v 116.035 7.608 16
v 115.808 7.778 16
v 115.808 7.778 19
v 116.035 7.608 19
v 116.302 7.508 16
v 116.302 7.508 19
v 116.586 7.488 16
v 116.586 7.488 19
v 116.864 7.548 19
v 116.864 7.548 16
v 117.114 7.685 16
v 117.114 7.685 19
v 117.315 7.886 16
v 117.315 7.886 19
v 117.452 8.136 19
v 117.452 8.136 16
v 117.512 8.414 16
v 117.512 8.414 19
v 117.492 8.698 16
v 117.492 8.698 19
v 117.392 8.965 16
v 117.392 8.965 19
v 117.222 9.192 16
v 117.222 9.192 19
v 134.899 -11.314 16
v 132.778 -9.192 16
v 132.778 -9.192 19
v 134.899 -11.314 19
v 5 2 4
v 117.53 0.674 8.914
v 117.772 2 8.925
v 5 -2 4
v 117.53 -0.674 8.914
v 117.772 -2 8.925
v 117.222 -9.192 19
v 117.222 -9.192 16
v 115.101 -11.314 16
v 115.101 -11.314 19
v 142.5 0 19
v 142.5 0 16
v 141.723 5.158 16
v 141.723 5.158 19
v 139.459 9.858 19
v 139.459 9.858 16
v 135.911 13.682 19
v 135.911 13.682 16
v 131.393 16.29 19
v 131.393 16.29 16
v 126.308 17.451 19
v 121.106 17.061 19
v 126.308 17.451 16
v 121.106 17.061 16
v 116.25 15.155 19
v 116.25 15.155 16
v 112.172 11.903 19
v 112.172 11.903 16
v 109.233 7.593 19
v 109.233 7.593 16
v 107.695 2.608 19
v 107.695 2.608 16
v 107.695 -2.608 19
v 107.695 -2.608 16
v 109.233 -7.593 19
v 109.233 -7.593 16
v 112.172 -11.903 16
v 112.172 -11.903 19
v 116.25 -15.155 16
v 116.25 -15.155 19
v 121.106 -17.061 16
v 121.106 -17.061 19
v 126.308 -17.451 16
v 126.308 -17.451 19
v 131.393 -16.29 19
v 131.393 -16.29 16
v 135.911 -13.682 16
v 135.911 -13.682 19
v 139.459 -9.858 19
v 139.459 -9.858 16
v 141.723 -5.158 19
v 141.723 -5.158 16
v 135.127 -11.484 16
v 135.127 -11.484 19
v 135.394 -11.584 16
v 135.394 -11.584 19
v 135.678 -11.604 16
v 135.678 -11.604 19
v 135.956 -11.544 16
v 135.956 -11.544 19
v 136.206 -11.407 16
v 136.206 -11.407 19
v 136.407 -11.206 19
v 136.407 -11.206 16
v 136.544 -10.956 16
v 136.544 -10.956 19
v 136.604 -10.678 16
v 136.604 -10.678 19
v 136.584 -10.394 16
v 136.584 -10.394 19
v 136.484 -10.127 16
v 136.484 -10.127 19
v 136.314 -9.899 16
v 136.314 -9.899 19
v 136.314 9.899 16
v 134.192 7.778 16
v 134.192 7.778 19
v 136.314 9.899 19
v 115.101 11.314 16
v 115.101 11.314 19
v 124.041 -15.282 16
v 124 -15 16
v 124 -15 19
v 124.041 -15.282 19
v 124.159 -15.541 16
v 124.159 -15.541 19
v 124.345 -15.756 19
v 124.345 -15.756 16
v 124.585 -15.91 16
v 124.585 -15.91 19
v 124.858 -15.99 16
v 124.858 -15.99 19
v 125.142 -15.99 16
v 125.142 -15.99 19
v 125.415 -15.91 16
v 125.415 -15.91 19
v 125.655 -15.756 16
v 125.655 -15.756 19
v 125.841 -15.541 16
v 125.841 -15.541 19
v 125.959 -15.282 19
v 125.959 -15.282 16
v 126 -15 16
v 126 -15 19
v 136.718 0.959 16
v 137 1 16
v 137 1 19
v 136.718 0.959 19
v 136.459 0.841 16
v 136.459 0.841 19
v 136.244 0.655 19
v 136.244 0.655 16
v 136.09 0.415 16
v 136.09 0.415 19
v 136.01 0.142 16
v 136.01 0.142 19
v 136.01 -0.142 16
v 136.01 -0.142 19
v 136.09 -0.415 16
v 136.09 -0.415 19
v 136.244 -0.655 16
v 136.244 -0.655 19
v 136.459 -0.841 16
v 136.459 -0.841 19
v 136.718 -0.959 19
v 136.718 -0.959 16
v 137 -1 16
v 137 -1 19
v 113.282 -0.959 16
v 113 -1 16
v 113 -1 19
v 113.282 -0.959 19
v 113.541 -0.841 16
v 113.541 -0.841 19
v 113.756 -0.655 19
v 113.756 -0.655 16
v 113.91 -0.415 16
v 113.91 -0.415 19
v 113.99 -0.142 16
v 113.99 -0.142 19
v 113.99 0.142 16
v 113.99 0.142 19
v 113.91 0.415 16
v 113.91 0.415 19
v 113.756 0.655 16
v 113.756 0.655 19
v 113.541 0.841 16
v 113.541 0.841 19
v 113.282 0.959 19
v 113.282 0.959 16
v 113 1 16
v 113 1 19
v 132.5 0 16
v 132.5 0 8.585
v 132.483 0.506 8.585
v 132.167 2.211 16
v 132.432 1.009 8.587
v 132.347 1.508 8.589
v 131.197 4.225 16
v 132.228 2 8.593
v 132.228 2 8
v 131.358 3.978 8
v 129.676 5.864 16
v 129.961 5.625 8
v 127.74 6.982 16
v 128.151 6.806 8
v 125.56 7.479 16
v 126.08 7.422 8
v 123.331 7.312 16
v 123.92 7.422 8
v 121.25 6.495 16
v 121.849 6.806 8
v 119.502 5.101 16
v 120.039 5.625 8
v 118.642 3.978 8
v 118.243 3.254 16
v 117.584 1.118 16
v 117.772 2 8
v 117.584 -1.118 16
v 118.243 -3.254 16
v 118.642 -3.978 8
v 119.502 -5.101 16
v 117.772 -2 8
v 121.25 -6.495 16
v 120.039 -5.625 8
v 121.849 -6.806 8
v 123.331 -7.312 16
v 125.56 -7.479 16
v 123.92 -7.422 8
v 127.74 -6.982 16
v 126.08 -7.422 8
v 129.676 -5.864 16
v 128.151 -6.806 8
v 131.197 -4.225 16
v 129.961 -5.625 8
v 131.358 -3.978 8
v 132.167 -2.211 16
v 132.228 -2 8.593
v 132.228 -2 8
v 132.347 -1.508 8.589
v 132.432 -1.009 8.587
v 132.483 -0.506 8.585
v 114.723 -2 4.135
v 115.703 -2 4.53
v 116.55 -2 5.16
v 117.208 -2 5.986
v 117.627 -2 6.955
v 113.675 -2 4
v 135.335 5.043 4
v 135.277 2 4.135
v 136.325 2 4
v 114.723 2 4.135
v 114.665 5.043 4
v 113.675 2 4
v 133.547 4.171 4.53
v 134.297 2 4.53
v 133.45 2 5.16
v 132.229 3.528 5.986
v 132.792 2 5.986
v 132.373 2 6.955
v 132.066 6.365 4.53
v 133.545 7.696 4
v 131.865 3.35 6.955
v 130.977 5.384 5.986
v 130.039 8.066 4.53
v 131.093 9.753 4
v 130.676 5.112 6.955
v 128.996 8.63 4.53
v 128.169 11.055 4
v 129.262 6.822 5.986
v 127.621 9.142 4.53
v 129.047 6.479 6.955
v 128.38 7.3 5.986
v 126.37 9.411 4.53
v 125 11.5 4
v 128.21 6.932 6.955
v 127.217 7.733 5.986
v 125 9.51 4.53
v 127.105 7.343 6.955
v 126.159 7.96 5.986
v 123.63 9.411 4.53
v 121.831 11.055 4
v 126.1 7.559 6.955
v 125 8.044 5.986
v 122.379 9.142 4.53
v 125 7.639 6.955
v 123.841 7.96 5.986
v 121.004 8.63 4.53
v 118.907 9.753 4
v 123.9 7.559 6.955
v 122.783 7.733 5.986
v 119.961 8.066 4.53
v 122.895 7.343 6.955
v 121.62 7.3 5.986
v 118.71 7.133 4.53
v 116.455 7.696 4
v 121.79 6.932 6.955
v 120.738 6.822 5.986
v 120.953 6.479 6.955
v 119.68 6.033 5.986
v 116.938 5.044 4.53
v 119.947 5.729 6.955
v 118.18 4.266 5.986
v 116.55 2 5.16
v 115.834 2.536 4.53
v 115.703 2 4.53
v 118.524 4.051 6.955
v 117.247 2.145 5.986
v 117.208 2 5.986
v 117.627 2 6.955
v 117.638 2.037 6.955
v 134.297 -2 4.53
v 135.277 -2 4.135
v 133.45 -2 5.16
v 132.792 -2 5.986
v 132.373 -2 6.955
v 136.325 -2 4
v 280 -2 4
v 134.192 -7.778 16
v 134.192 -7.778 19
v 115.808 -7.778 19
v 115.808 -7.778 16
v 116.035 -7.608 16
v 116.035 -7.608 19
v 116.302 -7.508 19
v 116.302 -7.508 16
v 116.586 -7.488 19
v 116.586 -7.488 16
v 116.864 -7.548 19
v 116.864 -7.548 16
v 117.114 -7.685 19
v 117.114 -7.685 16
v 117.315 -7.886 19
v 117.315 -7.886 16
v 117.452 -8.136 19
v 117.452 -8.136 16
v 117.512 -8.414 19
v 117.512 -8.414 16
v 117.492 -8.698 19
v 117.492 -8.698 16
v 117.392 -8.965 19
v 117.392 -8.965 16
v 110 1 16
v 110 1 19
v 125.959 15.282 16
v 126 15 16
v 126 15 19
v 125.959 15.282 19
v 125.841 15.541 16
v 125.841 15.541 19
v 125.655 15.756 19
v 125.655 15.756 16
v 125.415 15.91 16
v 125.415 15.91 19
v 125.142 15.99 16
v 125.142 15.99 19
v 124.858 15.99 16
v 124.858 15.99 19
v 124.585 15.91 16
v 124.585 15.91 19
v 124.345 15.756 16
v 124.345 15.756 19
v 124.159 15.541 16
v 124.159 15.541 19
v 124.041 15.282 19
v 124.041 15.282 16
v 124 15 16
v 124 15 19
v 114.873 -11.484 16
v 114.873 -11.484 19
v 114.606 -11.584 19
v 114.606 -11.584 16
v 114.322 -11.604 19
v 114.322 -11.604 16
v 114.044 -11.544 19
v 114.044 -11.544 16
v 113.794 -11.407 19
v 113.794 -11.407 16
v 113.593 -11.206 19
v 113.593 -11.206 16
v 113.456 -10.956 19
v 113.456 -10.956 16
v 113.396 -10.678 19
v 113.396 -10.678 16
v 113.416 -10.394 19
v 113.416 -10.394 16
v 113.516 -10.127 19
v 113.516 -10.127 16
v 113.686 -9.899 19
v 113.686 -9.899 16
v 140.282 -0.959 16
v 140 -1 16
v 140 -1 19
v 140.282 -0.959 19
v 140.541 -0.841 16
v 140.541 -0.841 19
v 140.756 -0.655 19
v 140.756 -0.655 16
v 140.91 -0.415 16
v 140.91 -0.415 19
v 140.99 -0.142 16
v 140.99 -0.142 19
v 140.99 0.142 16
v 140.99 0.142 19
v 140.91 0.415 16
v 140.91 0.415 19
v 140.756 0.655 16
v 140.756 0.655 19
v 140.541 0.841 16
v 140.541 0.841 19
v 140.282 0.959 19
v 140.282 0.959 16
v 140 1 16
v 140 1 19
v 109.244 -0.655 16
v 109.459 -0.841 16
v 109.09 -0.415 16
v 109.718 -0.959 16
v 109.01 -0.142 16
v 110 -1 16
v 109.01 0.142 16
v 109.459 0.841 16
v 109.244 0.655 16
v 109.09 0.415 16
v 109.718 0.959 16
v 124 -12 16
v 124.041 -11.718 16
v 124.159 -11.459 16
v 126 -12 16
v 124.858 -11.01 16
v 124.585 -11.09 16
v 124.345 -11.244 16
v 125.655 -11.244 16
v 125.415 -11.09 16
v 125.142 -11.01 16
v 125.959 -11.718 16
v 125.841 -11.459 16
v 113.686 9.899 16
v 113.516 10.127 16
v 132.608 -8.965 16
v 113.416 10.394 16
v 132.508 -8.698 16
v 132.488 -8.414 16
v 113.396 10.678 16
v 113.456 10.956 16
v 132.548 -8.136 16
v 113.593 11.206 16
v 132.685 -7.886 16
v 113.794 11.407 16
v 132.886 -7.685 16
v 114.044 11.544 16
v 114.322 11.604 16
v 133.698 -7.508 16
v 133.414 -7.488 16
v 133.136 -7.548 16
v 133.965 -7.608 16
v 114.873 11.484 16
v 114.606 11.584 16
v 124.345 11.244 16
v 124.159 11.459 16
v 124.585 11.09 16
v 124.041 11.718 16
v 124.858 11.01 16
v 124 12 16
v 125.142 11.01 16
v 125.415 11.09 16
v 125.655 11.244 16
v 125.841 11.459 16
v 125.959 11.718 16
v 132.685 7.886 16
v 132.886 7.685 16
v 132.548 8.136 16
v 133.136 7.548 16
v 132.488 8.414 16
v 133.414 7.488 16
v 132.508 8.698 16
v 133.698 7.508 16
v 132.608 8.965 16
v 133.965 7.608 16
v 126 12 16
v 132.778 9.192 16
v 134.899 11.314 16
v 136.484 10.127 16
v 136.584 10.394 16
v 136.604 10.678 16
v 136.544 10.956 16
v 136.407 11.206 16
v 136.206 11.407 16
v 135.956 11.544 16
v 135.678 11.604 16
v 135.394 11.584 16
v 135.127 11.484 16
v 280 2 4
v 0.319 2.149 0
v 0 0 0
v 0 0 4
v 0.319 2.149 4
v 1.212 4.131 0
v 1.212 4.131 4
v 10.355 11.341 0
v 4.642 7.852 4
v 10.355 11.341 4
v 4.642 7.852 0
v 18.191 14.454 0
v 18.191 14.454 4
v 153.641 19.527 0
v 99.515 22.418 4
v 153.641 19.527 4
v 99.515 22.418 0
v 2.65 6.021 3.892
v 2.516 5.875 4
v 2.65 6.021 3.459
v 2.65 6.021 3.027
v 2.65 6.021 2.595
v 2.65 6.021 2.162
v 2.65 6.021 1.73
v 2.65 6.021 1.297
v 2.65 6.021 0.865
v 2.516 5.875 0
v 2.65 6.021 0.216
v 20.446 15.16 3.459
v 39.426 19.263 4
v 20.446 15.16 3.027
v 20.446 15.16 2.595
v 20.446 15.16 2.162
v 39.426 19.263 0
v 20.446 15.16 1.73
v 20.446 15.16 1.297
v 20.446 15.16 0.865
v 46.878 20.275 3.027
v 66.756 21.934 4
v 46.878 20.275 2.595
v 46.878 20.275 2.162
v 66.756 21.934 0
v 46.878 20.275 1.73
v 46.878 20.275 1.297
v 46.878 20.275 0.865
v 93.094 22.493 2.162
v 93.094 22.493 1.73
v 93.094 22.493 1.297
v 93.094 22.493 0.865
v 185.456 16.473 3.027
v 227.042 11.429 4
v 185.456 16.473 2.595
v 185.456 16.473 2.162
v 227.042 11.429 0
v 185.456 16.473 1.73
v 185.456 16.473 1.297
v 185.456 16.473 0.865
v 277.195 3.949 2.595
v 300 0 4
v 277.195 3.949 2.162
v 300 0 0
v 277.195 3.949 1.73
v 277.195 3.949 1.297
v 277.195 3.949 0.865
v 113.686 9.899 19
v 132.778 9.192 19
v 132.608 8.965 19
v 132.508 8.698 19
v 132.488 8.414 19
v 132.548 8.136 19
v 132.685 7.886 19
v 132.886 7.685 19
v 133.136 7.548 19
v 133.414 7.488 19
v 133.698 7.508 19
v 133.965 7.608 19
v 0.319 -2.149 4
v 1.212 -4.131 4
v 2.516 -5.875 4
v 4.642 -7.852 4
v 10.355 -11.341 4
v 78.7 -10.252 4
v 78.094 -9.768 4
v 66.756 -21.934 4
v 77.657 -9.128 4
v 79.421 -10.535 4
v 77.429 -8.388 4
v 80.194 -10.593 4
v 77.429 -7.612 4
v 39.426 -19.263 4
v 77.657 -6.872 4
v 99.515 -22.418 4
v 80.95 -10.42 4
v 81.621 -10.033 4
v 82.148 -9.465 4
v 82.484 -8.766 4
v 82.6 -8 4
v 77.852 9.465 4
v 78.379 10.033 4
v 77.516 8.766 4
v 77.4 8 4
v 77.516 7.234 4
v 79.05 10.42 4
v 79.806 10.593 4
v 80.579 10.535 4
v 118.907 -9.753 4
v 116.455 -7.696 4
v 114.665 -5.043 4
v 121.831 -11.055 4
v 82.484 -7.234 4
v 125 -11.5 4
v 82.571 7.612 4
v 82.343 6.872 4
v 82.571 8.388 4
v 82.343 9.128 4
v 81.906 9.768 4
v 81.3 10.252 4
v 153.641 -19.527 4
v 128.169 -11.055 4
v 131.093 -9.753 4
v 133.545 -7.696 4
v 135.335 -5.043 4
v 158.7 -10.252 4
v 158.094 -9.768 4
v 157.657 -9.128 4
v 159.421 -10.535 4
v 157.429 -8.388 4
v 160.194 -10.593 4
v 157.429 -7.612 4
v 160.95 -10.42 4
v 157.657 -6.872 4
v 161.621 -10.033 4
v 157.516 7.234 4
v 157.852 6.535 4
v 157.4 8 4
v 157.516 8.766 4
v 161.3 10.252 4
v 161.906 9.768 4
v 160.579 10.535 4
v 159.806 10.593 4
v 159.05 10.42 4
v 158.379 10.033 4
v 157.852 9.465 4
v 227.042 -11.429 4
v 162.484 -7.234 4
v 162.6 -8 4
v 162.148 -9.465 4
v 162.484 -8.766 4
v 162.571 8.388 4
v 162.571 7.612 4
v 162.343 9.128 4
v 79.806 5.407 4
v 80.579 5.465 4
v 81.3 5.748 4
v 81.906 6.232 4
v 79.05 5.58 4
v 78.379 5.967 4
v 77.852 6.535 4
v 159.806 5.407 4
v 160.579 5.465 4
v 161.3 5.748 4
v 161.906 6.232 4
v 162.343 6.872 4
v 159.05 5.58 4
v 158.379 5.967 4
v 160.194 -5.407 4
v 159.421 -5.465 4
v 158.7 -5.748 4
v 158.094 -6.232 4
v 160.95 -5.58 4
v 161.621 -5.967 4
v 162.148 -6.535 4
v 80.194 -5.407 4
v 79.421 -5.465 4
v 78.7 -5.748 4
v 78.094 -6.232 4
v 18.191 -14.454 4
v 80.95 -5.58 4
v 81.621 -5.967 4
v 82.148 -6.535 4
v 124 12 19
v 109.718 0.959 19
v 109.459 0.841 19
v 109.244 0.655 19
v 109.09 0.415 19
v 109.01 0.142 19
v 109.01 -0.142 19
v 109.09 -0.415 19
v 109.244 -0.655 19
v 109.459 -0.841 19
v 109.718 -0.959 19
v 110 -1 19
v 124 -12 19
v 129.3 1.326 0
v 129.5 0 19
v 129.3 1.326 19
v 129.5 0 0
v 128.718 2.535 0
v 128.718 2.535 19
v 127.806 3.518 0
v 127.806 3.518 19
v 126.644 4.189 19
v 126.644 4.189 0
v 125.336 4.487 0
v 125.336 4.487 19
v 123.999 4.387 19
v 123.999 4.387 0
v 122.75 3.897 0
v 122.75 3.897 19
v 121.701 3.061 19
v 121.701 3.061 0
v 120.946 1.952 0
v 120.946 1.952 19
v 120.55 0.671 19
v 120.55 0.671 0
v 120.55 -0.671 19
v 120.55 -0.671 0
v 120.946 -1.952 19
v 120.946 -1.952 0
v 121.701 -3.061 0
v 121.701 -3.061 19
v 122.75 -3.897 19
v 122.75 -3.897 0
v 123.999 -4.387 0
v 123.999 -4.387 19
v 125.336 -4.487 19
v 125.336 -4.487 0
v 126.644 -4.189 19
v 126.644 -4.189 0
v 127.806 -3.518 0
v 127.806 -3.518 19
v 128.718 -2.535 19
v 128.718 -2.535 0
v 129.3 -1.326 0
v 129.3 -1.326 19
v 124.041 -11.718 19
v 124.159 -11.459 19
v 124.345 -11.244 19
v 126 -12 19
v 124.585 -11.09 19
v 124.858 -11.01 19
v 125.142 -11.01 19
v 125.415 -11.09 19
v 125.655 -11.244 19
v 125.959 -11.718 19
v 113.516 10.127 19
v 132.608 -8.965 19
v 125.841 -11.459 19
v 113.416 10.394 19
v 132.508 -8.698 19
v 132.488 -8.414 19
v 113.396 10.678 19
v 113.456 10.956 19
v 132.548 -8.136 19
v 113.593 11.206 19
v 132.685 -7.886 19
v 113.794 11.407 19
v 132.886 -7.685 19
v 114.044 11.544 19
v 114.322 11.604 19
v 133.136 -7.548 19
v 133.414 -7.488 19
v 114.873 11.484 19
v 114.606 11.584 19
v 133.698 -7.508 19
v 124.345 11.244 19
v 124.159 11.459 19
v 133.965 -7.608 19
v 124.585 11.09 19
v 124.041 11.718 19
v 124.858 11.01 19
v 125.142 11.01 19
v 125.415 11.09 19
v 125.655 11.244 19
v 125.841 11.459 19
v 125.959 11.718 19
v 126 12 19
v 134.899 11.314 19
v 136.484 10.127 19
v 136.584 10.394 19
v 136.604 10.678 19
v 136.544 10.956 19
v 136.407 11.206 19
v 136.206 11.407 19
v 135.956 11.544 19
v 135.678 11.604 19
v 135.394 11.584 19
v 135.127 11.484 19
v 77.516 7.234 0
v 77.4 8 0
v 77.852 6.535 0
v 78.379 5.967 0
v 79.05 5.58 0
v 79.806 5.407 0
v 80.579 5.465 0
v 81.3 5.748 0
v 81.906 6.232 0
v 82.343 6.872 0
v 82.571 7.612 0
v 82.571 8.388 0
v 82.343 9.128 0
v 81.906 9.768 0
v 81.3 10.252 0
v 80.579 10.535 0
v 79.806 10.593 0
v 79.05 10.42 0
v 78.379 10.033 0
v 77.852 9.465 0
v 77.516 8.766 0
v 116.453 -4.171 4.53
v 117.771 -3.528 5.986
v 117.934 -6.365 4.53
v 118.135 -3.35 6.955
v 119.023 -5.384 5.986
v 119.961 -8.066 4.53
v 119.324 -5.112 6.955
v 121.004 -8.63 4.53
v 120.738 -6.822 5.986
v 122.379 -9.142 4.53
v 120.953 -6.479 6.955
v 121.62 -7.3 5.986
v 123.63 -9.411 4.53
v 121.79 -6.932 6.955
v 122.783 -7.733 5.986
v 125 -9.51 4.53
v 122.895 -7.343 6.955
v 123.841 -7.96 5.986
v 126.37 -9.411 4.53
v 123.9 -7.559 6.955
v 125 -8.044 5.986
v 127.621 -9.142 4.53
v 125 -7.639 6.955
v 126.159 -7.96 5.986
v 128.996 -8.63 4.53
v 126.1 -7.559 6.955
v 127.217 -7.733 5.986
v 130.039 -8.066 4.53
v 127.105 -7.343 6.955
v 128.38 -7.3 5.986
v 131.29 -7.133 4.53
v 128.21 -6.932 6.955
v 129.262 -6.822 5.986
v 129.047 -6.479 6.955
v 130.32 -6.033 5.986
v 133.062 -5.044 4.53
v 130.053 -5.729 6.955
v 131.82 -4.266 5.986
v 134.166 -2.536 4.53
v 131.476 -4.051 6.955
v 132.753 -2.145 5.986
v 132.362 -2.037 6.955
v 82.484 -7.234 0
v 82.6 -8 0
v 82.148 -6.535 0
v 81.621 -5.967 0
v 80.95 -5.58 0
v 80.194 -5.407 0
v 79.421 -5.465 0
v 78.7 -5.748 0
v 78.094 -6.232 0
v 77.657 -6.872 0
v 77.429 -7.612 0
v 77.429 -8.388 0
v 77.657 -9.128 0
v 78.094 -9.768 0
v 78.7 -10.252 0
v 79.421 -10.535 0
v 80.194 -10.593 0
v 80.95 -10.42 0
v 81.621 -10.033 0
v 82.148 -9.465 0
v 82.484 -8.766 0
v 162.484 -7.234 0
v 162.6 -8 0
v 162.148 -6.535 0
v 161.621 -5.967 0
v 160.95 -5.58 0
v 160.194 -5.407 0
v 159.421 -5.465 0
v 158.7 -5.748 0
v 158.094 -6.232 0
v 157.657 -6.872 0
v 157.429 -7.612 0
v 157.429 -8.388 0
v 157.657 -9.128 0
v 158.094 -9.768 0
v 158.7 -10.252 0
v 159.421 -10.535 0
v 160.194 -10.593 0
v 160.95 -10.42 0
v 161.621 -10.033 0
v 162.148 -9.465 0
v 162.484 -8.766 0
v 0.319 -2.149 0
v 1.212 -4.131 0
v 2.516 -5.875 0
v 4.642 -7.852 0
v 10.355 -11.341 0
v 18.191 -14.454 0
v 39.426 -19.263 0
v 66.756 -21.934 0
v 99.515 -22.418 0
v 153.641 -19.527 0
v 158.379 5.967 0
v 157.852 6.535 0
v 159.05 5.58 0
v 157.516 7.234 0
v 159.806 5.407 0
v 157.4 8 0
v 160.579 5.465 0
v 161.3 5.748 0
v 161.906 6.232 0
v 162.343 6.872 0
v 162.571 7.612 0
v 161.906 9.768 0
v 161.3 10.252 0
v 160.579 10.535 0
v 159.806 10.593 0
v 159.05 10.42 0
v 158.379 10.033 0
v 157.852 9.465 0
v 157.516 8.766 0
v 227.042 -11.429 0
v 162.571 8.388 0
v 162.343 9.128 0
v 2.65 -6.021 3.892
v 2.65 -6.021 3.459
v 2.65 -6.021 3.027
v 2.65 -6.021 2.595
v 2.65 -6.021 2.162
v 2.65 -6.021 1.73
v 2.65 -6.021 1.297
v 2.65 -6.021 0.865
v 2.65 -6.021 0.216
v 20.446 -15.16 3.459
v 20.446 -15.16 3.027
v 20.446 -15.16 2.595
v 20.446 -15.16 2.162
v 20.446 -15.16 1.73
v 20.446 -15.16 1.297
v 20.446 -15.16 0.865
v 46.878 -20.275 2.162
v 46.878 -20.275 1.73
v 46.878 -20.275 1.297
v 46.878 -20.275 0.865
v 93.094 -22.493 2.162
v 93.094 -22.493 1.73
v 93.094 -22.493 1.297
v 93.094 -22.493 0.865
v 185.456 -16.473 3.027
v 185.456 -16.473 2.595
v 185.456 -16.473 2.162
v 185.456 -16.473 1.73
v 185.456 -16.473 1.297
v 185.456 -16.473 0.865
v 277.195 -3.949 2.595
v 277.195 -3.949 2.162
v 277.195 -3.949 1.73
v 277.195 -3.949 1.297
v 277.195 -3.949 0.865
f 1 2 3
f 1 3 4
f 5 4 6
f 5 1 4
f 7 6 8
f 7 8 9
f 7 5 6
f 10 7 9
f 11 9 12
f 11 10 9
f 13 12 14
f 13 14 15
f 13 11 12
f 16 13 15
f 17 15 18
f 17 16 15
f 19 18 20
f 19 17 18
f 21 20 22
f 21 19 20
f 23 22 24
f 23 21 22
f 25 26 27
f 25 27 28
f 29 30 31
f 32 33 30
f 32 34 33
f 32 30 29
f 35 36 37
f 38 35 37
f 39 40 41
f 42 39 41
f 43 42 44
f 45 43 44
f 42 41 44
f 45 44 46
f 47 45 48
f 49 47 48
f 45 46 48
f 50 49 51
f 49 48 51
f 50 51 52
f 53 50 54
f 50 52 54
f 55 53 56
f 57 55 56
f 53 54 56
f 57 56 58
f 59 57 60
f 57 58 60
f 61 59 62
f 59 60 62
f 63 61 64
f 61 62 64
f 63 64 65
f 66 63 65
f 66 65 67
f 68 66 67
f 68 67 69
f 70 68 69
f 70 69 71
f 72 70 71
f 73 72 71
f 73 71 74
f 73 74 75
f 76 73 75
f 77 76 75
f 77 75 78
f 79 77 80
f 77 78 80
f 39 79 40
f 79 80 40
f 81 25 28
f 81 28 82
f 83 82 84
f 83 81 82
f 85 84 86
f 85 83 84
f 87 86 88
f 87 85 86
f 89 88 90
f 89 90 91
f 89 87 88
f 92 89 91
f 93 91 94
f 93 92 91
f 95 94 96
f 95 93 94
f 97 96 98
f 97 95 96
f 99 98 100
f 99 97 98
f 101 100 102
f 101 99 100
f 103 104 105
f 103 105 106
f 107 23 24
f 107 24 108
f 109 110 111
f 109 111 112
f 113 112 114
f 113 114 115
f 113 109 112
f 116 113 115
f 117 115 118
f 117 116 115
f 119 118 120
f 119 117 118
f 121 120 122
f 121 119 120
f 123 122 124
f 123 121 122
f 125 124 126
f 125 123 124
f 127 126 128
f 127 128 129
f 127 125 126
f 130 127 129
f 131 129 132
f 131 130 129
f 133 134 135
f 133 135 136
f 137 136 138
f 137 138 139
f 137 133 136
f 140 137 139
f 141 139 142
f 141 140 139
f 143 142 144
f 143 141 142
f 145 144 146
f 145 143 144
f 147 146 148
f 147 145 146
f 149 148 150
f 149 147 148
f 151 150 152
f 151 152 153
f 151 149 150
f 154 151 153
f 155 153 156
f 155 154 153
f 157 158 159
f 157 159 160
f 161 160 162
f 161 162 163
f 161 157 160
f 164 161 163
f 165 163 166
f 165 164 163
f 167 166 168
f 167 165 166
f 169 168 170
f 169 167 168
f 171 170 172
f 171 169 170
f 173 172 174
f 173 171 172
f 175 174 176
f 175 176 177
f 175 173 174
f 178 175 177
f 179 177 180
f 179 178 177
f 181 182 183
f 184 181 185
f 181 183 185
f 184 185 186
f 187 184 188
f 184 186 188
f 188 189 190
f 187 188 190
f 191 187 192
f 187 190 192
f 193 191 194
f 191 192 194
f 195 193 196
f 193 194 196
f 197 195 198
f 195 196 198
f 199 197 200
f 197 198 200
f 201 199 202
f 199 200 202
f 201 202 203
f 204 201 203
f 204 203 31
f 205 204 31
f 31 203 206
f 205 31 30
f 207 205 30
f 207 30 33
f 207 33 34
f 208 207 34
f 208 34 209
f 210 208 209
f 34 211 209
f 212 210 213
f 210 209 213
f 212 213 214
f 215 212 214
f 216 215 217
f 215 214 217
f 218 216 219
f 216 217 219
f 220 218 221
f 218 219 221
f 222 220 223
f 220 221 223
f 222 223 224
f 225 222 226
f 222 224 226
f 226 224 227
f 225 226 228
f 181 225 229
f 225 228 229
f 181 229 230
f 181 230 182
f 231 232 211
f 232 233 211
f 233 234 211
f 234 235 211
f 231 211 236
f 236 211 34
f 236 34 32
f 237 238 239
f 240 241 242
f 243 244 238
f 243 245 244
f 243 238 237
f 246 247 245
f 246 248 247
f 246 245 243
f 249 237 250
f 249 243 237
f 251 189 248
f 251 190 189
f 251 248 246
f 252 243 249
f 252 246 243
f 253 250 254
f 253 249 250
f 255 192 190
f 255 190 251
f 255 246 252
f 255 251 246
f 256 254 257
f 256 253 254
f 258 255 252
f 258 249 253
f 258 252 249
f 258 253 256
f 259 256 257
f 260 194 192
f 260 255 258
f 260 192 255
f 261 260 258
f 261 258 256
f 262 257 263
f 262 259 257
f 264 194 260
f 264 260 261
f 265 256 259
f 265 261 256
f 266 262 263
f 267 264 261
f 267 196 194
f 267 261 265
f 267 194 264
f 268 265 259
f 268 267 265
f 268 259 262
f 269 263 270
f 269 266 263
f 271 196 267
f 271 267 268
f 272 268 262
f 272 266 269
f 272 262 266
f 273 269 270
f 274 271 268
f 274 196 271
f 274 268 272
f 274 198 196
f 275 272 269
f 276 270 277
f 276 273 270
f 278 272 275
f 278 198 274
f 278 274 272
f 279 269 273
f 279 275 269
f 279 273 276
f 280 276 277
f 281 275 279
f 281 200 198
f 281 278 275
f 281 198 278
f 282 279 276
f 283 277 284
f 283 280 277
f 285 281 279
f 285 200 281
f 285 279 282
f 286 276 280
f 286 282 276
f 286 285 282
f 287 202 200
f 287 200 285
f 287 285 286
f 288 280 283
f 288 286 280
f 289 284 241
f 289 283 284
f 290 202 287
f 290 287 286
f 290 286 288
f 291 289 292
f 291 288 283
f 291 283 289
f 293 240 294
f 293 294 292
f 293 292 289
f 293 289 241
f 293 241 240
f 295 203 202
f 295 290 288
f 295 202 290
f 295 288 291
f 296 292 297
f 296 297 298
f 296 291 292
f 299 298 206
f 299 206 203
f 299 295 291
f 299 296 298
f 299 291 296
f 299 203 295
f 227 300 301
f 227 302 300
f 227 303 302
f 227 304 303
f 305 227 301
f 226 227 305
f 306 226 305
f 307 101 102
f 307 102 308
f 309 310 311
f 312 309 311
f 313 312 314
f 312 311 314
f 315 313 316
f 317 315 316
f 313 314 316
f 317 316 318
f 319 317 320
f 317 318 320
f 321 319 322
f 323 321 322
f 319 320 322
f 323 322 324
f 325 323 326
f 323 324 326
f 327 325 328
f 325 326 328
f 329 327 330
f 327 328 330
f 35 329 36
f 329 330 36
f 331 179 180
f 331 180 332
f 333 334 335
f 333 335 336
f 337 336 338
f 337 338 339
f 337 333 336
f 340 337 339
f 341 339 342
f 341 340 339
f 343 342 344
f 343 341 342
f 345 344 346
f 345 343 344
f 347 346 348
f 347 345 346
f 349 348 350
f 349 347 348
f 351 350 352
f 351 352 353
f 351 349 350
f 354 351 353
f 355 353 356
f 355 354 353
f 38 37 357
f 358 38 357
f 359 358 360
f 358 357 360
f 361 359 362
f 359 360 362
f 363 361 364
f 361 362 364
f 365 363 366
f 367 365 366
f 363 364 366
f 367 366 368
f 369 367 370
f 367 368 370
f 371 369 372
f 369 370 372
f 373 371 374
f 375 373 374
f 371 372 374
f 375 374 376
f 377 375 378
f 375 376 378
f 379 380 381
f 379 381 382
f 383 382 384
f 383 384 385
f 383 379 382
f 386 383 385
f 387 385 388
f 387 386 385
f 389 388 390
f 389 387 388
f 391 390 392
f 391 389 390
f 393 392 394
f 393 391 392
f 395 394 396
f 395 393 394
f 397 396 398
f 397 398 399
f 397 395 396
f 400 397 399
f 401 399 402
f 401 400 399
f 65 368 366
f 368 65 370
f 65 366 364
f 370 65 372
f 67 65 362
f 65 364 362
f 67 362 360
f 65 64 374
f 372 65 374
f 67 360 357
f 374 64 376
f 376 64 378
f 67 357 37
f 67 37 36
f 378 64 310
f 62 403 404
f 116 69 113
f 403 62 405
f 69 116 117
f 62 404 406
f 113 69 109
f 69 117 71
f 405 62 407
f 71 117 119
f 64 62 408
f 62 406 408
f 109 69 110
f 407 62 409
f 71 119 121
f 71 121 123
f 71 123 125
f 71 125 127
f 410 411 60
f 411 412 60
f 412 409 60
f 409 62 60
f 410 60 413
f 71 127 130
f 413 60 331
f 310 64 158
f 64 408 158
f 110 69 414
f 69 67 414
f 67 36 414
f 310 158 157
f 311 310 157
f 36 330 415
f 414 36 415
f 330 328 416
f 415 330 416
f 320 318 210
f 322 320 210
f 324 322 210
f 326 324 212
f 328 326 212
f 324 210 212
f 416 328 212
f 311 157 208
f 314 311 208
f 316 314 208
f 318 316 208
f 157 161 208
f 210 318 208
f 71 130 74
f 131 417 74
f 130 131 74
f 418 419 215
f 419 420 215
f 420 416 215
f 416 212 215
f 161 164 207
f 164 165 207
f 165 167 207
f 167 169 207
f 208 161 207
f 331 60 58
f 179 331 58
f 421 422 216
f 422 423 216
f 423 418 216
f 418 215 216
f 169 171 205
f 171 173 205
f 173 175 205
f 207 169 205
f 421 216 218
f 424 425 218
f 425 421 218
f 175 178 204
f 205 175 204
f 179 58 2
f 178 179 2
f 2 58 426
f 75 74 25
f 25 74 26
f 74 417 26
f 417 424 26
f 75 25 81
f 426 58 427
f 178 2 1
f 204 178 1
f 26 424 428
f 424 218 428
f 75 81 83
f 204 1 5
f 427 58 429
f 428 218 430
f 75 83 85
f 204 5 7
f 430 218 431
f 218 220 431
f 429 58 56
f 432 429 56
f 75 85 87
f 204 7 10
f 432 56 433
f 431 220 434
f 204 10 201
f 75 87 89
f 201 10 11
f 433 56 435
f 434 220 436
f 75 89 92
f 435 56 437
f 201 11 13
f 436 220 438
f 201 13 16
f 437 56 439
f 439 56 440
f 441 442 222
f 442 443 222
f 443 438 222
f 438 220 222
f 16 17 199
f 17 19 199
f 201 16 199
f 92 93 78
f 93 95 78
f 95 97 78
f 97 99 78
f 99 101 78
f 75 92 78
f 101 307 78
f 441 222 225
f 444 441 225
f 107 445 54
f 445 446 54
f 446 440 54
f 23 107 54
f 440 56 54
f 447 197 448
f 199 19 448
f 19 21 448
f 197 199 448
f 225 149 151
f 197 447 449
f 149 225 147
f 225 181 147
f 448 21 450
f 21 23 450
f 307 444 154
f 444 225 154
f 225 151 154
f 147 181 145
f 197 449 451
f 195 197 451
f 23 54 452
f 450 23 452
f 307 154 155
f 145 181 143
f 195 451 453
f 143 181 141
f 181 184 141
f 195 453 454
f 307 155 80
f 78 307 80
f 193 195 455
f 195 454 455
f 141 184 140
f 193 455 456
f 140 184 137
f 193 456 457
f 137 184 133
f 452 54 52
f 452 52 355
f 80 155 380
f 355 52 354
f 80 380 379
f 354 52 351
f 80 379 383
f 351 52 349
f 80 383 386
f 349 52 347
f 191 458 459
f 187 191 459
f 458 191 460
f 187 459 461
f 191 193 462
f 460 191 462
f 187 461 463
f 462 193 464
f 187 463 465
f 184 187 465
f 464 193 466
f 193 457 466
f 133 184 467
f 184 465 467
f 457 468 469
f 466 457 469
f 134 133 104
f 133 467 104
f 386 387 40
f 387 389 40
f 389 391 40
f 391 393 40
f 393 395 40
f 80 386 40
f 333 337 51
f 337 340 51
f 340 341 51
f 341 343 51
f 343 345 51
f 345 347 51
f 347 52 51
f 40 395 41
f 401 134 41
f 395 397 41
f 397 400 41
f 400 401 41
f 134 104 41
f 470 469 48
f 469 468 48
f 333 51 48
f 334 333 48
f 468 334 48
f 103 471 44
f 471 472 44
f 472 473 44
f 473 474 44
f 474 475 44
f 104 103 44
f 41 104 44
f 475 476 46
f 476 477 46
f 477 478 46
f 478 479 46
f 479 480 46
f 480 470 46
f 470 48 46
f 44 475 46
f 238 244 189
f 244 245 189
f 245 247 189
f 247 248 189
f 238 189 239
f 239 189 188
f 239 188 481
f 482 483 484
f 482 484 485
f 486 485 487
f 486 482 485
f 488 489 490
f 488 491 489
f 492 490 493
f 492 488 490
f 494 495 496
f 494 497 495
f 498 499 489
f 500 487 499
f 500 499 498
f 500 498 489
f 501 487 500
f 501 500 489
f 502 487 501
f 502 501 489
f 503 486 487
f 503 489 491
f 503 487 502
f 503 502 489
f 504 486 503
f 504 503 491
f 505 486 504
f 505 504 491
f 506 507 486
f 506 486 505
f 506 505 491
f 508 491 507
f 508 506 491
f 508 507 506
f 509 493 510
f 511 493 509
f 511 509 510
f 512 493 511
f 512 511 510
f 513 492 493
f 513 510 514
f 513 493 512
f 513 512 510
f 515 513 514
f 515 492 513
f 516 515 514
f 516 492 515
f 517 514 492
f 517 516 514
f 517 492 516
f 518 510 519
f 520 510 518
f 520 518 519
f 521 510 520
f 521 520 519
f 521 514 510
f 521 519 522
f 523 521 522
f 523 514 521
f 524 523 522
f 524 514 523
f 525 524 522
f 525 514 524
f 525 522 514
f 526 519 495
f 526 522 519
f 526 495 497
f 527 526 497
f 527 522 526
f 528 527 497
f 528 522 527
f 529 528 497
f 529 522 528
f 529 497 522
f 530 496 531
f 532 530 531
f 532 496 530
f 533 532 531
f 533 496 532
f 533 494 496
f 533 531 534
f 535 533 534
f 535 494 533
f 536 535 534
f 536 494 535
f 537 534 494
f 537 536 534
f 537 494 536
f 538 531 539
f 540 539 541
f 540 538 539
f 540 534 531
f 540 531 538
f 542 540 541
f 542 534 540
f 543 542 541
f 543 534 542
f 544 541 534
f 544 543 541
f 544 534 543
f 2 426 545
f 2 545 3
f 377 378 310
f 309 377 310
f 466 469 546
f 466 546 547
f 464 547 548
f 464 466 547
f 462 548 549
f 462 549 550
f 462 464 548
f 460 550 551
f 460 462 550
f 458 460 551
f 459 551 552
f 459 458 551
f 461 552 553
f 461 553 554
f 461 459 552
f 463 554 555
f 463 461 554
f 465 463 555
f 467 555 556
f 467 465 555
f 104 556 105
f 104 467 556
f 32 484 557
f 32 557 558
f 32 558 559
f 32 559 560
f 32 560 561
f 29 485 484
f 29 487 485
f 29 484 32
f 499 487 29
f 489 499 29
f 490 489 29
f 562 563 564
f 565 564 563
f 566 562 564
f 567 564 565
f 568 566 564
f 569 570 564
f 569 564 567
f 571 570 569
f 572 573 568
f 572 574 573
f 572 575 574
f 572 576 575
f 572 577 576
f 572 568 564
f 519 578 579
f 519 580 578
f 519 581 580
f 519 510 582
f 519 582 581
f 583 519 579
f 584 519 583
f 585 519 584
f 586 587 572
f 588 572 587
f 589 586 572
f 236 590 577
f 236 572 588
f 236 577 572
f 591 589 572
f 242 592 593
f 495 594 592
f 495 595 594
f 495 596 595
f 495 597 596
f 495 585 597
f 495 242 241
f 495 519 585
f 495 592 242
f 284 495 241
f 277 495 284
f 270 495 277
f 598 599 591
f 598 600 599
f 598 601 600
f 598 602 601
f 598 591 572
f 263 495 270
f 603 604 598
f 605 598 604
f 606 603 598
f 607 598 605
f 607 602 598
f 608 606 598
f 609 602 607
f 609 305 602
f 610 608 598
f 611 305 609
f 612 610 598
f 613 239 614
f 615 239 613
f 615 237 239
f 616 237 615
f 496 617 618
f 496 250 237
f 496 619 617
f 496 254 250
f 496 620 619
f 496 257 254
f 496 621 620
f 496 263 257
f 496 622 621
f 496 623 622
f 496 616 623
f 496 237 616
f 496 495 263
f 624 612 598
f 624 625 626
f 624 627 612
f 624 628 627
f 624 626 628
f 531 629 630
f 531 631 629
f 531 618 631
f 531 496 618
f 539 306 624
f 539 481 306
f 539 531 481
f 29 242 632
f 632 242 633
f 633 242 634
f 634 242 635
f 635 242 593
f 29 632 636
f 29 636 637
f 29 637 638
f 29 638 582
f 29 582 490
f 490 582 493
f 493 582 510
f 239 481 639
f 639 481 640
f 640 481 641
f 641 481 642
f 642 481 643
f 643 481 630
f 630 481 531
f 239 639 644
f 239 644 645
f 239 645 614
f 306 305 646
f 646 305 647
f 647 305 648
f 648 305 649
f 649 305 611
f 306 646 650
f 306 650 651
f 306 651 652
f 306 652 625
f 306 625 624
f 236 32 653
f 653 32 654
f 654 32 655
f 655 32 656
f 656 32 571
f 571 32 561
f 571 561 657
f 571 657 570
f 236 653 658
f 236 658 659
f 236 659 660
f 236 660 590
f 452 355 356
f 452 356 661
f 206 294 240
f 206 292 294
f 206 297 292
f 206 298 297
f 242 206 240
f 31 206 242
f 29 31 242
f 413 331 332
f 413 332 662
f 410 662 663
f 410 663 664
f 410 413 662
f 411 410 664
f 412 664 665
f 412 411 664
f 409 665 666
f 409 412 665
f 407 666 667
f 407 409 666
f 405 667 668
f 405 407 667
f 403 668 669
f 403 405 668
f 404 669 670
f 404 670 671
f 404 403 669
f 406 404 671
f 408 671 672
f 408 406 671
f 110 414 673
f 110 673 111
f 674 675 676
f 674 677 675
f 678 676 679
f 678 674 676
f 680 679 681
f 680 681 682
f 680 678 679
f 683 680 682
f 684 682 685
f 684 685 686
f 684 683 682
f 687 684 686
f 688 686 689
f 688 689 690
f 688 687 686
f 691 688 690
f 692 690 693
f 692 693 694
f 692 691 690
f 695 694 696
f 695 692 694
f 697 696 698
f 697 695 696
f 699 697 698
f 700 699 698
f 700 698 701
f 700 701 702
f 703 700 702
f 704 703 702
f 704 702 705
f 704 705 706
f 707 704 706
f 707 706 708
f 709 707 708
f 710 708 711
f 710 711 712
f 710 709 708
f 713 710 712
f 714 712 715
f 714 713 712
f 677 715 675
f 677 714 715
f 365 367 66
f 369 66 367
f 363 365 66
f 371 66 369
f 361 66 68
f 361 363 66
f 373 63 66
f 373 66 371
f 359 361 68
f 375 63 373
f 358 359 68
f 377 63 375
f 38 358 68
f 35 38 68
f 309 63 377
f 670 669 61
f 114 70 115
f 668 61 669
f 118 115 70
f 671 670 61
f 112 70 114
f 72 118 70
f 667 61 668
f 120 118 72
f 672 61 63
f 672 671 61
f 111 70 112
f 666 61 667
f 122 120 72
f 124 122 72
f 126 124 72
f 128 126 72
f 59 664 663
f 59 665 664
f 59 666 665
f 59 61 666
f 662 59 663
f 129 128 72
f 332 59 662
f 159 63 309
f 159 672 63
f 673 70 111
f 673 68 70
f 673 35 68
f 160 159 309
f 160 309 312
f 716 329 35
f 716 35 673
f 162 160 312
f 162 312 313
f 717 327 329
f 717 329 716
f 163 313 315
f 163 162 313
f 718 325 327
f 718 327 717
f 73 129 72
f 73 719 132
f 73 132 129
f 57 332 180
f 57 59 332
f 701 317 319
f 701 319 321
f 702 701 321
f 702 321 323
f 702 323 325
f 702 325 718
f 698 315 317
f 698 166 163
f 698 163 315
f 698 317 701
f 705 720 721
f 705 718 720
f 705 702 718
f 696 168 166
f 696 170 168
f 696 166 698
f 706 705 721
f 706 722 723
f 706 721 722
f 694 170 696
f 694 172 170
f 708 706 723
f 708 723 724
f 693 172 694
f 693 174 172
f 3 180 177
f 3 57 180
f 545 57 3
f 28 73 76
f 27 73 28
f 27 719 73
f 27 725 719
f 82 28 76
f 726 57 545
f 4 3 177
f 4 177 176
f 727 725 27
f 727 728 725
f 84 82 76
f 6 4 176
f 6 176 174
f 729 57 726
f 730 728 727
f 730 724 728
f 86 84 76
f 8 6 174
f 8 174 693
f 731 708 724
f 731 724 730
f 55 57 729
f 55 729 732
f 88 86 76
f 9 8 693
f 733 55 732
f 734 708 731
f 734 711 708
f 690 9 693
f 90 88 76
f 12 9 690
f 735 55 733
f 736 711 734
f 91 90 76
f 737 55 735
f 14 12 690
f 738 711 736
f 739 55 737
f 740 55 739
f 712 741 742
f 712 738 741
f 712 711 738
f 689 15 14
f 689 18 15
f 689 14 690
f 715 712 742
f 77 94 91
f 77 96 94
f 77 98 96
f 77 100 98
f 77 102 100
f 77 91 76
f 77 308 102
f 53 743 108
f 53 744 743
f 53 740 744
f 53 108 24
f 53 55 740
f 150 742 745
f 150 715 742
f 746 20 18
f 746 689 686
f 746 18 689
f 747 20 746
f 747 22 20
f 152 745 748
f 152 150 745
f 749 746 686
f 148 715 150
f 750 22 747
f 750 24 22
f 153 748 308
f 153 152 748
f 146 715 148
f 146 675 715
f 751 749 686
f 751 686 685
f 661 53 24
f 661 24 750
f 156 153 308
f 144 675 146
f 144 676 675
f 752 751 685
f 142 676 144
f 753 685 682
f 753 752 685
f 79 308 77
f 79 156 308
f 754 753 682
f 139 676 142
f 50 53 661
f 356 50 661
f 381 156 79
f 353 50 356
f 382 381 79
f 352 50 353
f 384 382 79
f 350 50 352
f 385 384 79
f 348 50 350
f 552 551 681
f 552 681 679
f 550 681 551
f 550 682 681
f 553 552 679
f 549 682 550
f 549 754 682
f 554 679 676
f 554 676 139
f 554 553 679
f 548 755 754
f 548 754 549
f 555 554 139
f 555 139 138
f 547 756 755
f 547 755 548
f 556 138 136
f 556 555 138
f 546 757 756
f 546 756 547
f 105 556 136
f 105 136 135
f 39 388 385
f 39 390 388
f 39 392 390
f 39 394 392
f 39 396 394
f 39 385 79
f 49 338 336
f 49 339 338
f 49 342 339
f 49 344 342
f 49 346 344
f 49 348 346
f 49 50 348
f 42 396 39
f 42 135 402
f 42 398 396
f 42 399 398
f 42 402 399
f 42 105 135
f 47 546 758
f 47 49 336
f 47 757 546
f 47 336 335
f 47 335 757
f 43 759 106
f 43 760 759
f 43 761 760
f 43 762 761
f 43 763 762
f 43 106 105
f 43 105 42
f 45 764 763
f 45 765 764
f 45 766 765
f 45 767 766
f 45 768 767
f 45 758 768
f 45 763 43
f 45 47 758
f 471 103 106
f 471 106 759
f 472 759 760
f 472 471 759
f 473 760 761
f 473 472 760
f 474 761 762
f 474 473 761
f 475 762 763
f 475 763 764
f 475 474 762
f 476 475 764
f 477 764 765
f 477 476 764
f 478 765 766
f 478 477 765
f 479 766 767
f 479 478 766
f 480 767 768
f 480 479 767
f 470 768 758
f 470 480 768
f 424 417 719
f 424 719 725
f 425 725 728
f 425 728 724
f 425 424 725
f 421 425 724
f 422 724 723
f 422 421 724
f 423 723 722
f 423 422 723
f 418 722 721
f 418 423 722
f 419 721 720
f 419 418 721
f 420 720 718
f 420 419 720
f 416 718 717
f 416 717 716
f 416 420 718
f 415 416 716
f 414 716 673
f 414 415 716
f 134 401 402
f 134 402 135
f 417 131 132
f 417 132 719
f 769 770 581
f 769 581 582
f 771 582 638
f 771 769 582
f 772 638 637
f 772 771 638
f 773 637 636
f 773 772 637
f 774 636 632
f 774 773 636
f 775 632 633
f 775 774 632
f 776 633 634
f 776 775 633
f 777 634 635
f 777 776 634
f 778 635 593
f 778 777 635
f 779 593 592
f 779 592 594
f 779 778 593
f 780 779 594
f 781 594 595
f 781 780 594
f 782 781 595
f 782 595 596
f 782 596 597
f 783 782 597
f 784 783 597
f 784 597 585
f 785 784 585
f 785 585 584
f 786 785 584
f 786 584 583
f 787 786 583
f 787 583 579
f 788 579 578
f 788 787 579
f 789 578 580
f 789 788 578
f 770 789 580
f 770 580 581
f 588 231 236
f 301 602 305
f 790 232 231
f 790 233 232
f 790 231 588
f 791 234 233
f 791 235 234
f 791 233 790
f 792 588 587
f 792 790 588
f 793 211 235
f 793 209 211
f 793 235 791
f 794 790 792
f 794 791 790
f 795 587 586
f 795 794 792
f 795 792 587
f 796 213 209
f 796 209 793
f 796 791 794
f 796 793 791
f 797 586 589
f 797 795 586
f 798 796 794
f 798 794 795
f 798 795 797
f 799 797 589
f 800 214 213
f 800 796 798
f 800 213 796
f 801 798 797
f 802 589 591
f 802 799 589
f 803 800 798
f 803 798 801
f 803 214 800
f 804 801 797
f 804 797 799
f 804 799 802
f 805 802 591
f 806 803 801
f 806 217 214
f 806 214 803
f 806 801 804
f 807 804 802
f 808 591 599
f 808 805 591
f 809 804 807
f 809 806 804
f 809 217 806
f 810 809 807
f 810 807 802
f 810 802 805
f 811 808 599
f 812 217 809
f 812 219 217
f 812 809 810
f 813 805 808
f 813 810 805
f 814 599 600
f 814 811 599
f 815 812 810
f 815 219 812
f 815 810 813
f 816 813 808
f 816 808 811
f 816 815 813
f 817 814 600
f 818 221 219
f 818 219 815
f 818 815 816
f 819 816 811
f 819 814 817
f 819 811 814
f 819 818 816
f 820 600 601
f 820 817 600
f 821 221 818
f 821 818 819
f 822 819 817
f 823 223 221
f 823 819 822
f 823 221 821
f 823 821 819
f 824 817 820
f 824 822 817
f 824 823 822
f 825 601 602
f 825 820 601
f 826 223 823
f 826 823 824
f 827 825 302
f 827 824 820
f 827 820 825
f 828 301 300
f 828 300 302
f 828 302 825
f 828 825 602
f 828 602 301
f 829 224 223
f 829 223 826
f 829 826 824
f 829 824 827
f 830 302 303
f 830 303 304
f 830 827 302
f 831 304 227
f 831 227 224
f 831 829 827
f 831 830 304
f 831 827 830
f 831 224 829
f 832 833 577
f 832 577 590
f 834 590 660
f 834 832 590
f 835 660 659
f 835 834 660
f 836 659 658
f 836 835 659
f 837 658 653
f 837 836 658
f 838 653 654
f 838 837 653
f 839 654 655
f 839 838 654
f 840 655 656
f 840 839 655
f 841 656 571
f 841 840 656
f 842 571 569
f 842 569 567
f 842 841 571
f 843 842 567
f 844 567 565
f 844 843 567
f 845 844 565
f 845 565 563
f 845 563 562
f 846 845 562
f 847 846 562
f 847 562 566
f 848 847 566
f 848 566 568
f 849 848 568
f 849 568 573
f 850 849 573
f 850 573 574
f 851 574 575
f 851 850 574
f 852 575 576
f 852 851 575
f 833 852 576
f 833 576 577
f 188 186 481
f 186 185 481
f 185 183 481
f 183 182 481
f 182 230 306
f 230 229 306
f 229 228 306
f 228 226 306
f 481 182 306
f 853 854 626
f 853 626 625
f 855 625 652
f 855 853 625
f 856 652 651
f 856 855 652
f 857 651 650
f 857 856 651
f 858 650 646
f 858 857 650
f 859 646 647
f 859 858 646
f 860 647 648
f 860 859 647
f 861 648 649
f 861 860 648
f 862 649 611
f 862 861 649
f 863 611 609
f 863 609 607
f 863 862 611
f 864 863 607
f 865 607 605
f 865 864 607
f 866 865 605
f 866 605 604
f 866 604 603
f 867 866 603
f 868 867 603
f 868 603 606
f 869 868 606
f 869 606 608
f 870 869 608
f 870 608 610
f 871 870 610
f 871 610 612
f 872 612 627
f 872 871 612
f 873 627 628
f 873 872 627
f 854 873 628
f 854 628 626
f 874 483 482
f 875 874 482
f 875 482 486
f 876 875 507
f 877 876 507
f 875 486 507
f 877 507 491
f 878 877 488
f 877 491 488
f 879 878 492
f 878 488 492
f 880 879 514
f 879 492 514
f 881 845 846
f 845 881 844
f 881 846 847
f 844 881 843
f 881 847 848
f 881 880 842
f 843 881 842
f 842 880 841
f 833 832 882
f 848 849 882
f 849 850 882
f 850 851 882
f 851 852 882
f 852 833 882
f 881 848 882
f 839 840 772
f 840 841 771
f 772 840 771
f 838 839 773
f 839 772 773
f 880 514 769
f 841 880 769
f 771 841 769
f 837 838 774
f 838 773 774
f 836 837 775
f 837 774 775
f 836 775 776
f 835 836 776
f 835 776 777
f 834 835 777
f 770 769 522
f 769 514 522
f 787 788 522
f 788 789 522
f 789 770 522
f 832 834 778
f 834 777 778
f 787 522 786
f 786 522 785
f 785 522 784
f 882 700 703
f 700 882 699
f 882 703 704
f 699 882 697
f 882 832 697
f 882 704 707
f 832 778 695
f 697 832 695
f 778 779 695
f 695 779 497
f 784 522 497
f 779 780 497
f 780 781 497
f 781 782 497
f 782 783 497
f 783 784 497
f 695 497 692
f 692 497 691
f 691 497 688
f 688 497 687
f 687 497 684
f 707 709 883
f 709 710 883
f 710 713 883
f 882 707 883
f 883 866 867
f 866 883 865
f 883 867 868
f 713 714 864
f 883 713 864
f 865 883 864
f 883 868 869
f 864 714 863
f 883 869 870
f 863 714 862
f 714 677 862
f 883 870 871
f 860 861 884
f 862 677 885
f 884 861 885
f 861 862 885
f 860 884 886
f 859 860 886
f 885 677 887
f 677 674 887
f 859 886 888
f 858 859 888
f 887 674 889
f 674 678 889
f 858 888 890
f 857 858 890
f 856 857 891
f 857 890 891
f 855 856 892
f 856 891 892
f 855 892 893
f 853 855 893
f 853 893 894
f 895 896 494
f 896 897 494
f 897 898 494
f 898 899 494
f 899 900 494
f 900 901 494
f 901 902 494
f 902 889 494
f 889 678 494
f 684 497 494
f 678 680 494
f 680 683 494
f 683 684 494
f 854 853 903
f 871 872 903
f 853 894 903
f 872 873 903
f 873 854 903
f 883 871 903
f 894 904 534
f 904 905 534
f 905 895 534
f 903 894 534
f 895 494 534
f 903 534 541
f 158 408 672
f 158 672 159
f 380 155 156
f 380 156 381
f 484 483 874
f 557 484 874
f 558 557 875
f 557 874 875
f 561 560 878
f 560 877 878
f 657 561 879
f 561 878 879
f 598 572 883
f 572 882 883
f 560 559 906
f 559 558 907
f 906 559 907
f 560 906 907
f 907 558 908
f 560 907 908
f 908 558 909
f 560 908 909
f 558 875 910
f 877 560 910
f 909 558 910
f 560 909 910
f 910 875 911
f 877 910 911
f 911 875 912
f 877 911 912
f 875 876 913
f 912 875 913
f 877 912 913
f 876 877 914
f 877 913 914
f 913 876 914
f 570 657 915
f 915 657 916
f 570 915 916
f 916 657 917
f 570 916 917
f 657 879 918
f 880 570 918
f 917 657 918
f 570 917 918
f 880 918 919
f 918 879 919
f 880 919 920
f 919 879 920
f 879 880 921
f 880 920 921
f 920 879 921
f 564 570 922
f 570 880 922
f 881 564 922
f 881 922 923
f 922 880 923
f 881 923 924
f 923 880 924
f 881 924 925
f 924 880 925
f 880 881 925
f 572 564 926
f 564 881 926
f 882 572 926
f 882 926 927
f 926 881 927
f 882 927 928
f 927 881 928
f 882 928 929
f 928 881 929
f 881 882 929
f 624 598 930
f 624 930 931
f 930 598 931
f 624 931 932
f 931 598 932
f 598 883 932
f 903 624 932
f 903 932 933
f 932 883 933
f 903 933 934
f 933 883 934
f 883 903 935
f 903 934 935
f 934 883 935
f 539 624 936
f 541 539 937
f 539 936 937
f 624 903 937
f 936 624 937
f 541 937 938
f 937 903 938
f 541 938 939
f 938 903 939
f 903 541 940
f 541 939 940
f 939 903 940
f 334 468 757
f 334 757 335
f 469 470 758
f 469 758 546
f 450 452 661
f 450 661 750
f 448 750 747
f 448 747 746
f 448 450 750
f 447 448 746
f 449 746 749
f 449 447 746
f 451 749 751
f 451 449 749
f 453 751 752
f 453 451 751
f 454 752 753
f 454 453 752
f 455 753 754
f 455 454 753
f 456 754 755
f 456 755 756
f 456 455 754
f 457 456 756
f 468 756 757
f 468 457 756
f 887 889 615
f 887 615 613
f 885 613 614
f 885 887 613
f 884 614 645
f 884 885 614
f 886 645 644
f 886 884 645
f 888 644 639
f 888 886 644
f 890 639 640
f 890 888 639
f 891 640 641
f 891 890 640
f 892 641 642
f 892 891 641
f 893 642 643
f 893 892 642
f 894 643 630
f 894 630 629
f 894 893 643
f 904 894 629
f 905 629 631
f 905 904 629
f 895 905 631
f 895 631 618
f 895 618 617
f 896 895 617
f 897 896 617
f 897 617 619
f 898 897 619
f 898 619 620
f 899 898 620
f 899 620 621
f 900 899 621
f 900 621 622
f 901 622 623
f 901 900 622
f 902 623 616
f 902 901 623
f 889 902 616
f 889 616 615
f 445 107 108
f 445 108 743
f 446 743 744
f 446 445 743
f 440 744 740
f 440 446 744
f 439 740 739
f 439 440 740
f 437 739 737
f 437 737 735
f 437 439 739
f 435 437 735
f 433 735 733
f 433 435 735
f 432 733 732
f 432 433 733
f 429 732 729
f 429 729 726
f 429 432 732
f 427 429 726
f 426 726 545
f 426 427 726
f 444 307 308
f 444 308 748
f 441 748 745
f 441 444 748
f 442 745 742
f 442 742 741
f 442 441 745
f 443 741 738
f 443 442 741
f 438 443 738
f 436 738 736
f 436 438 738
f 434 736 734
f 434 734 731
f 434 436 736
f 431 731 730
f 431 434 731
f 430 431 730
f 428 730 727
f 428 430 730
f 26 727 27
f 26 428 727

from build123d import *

# Parameters (mm, degrees)
SKETCH_1_R      = 4.5
SKETCH_1_R_2    = 2.6
EXTRUDE_1_DEPTH = 4
SKETCH_2_R      = 7.5
SKETCH_2_R_2    = 4.5
EXTRUDE_2_DEPTH = 12
RIB_7_REACH     = 303.268
SKETCH_4_WALL_W = 719.144994966
SKETCH_4_WALL_H = 4
RIB_8_REACH     = 303.268
SKETCH_5_WALL_W = 753.964961
SKETCH_5_WALL_H = 4
FILLET_1_R      = 4
SKETCH_6_R      = 17.5
SKETCH_6_R_2    = 4.5
EXTRUDE_3_DEPTH = 3


with BuildPart() as part:
    # 草图1 → 凸台-拉伸1 (new body)
    with BuildSketch(Plane.XY):
        with BuildLine():
            add(Edge.make_bspline(
                [(0, 0), (-9.5489e-05, -0.326407864), (0.030950281, -0.854000019), (0.150423202, -1.616777315), (0.448674258, -2.608935021), (0.848421592, -3.530047693), (1.433806351, -4.534449955), (2.263610744, -5.639668731), (3.456837907, -6.896675246), (5.225908513, -8.375867947), (7.906613431, -10.141837985), (11.989896233, -12.22562949), (18.321708513, -14.665606049), (27.826133031, -17.300188207), (41.974112353, -19.921000387), (60.222043604, -21.810463358), (78.624134319, -22.552186027), (95.988954389, -22.549739294), (113.345884106, -22.102249143), (130.689546496, -21.271088382), (148.01027967, -20.054961298), (165.306340091, -18.538013572), (179.703344131, -17.102052063), (191.21103146, -15.859228418), (201.272024493, -14.695659938), (209.889114389, -13.64726737), (217.06675899, -12.740467847), (222.804921516, -11.995811085), (229.977619163, -11.040364781), (238.573919489, -9.856643655), (248.605455284, -8.418167008), (258.611446595, -6.914785611), (267.201727162, -5.572315852), (274.322933639, -4.424865398), (280.072746677, -3.475406948), (285.700780324, -2.525508132), (290.829335304, -1.636879112), (294.873159607, -0.924080287), (298.04592284, -0.353968123), (299.35238804, -0.117662998), (300, 0)],
                knots=[0, 0, 0, 0, 0, 0.003840944, 0.006235023, 0.009072291, 0.01219322, 0.015656839, 0.019917177, 0.025338962, 0.032592504, 0.042799388, 0.05770457, 0.079310668, 0.112503101, 0.158972616, 0.227236465, 0.295500326, 0.329632258, 0.36376419, 0.432028053, 0.500291915, 0.534423847, 0.56855578, 0.602687711, 0.636819643, 0.653885609, 0.670951575, 0.688017542, 0.705083508, 0.739215439, 0.773347371, 0.807479302, 0.824545268, 0.841611234, 0.8586772, 0.875743167, 0.892809133, 0.901342117, 0.9098751, 0.9098751, 0.9098751, 0.9098751, 0.9098751], degree=4))
            add(Edge.make_bspline(
                [(0, 0), (-9.5489e-05, 0.326407864), (0.030950281, 0.854000019), (0.150423202, 1.616777315), (0.448674258, 2.608935021), (0.848421592, 3.530047693), (1.433806351, 4.534449955), (2.263610744, 5.639668731), (3.456837907, 6.896675246), (5.225908513, 8.375867947), (7.906613431, 10.141837985), (11.989896233, 12.22562949), (18.321708513, 14.665606049), (27.826133031, 17.300188207), (41.974112353, 19.921000387), (60.222043604, 21.810463358), (78.624134319, 22.552186027), (95.988954389, 22.549739295), (113.345884106, 22.102249143), (130.689546496, 21.271088382), (148.01027967, 20.054961298), (165.306340091, 18.538013572), (179.703344131, 17.102052063), (191.21103146, 15.859228418), (201.272024493, 14.695659938), (209.889114389, 13.64726737), (217.06675899, 12.740467847), (222.804921516, 11.995811086), (229.977619163, 11.040364781), (238.573919489, 9.856643655), (248.605455284, 8.418167008), (258.611446595, 6.914785611), (267.201727162, 5.572315852), (274.322933639, 4.424865398), (280.072746677, 3.475406948), (285.700780324, 2.525508132), (290.829335304, 1.636879112), (294.873159607, 0.924080288), (298.04592284, 0.353968123), (299.35238804, 0.117662998), (300, 0)],
                knots=[0, 0, 0, 0, 0, 0.003840944, 0.006235023, 0.009072291, 0.01219322, 0.015656839, 0.019917177, 0.025338962, 0.032592504, 0.042799388, 0.05770457, 0.079310668, 0.112503101, 0.158972616, 0.227236465, 0.295500326, 0.329632258, 0.36376419, 0.432028053, 0.500291915, 0.534423847, 0.56855578, 0.602687711, 0.636819643, 0.653885609, 0.670951575, 0.688017542, 0.705083508, 0.739215439, 0.773347371, 0.807479302, 0.824545268, 0.841611234, 0.8586772, 0.875743167, 0.892809133, 0.901342117, 0.9098751, 0.9098751, 0.9098751, 0.9098751, 0.9098751], degree=4))
        make_face()
        with Locations((125, 0)):
            Circle(SKETCH_1_R, mode=Mode.SUBTRACT)
        with Locations((80, -8)):
            Circle(SKETCH_1_R_2, mode=Mode.SUBTRACT)
        with Locations((160, -8)):
            Circle(SKETCH_1_R_2, mode=Mode.SUBTRACT)
        with Locations(Location((80, 8, 0), (0, 0, 180))):
            Circle(SKETCH_1_R_2, mode=Mode.SUBTRACT)
        with Locations(Location((160, 8, 0), (0, 0, 180))):
            Circle(SKETCH_1_R_2, mode=Mode.SUBTRACT)
    extrude(amount=EXTRUDE_1_DEPTH)

    # 草图2 → 凸台-拉伸2 (add)
    with BuildSketch(Plane.XY.offset(4)):
        with Locations((125, 0)):
            Circle(SKETCH_2_R)
        with Locations((125, 0)):
            Circle(SKETCH_2_R_2, mode=Mode.SUBTRACT)
    extrude(amount=EXTRUDE_2_DEPTH)

    # 草图4 wall → 筋7 (add, up to next)
    with BuildSketch(Plane(origin=(62.25, 0, 6.5), x_dir=(-0.999047908993, 0, -0.043626546244), z_dir=(-0.043626546244, 0, 0.999047908993)), mode=Mode.PRIVATE) as rib_7_sk1:
        Rectangle(SKETCH_4_WALL_W, SKETCH_4_WALL_H)
    rib_7_tool1 = extrude(rib_7_sk1.sketch, amount=-RIB_7_REACH, mode=Mode.PRIVATE) - part.part
    add(rib_7_tool1.solids().sort_by_distance((62.25, 0, 6.5))[0])

    # 草图5 wall → 筋8 (add, up to next)
    with BuildSketch(Plane(origin=(205.321523309, 0, 6.321191727), x_dir=(0.999517289679, 0, -0.031067469057), z_dir=(-0.031067469057, 0, -0.999517289679)), mode=Mode.PRIVATE) as rib_8_sk1:
        Rectangle(SKETCH_5_WALL_W, SKETCH_5_WALL_H)
    rib_8_tool1 = extrude(rib_8_sk1.sketch, amount=RIB_8_REACH, mode=Mode.PRIVATE) - part.part
    add(rib_8_tool1.solids().sort_by_distance((205.321523309, 0, 6.321191727))[0])

    # 圆角1
    fillet_1_edges = [part.edges().sort_by_distance(p)[0] for p in [
        (125, -7.5, 4),
        (125, 7.5, 4),
    ]]
    fillet(fillet_1_edges, radius=FILLET_1_R)

    # 草图6 → 凸台-拉伸3 (add)
    with BuildSketch(Plane.XY.offset(16)):
        with Locations((125, 0)):
            Circle(SKETCH_6_R)
        with Locations((125, 0)):
            Circle(SKETCH_6_R_2, mode=Mode.SUBTRACT)
        with BuildLine():
            Line((140, 1), (137, 1))
            ThreePointArc((137, 1), (136, 0), (137, -1))
            Line((137, -1), (140, -1))
            ThreePointArc((140, -1), (141, 0), (140, 1))
        make_face(mode=Mode.SUBTRACT)
        with BuildLine():
            Line((110, -1), (113, -1))
            ThreePointArc((113, -1), (114, 0), (113, 1))
            Line((113, 1), (110, 1))
            ThreePointArc((110, 1), (109, 0), (110, -1))
        make_face(mode=Mode.SUBTRACT)
        with BuildLine():
            Line((126, -15), (126, -12))
            ThreePointArc((126, -12), (125, -11), (124, -12))
            Line((124, -12), (124, -15))
            ThreePointArc((124, -15), (125, -16), (126, -15))
        make_face(mode=Mode.SUBTRACT)
        with BuildLine():
            Line((124, 15), (124, 12))
            ThreePointArc((124, 12), (125, 11), (126, 12))
            Line((126, 12), (126, 15))
            ThreePointArc((126, 15), (125, 16), (124, 15))
        make_face(mode=Mode.SUBTRACT)
        with BuildLine():
            Line((134.899494937, 11.313708499), (132.778174593, 9.192388155))
            ThreePointArc((132.778174593, 9.192388155), (132.778174593, 7.778174593), (134.192388155, 7.778174593))
            Line((134.192388155, 7.778174593), (136.313708499, 9.899494937))
            ThreePointArc((136.313708499, 9.899494937), (136.313708499, 11.313708499), (134.899494937, 11.313708499))
        make_face(mode=Mode.SUBTRACT)
        with BuildLine():
            Line((113.686291501, 9.899494937), (115.807611845, 7.778174593))
            ThreePointArc((115.807611845, 7.778174593), (117.221825407, 7.778174593), (117.221825407, 9.192388155))
            Line((117.221825407, 9.192388155), (115.100505063, 11.313708499))
            ThreePointArc((115.100505063, 11.313708499), (113.686291501, 11.313708499), (113.686291501, 9.899494937))
        make_face(mode=Mode.SUBTRACT)
        with BuildLine():
            Line((113.686291501, -9.899494937), (115.807611845, -7.778174593))
            ThreePointArc((115.807611845, -7.778174593), (117.221825407, -7.778174593), (117.221825407, -9.192388155))
            Line((117.221825407, -9.192388155), (115.100505063, -11.313708499))
            ThreePointArc((115.100505063, -11.313708499), (113.686291501, -11.313708499), (113.686291501, -9.899494937))
        make_face(mode=Mode.SUBTRACT)
        with BuildLine():
            Line((136.313708499, -9.899494937), (134.192388155, -7.778174593))
            ThreePointArc((134.192388155, -7.778174593), (132.778174593, -7.778174593), (132.778174593, -9.192388155))
            Line((132.778174593, -9.192388155), (134.899494937, -11.313708499))
            ThreePointArc((134.899494937, -11.313708499), (136.313708499, -11.313708499), (136.313708499, -9.899494937))
        make_face(mode=Mode.SUBTRACT)
    extrude(amount=EXTRUDE_3_DEPTH)


solid = part.part
